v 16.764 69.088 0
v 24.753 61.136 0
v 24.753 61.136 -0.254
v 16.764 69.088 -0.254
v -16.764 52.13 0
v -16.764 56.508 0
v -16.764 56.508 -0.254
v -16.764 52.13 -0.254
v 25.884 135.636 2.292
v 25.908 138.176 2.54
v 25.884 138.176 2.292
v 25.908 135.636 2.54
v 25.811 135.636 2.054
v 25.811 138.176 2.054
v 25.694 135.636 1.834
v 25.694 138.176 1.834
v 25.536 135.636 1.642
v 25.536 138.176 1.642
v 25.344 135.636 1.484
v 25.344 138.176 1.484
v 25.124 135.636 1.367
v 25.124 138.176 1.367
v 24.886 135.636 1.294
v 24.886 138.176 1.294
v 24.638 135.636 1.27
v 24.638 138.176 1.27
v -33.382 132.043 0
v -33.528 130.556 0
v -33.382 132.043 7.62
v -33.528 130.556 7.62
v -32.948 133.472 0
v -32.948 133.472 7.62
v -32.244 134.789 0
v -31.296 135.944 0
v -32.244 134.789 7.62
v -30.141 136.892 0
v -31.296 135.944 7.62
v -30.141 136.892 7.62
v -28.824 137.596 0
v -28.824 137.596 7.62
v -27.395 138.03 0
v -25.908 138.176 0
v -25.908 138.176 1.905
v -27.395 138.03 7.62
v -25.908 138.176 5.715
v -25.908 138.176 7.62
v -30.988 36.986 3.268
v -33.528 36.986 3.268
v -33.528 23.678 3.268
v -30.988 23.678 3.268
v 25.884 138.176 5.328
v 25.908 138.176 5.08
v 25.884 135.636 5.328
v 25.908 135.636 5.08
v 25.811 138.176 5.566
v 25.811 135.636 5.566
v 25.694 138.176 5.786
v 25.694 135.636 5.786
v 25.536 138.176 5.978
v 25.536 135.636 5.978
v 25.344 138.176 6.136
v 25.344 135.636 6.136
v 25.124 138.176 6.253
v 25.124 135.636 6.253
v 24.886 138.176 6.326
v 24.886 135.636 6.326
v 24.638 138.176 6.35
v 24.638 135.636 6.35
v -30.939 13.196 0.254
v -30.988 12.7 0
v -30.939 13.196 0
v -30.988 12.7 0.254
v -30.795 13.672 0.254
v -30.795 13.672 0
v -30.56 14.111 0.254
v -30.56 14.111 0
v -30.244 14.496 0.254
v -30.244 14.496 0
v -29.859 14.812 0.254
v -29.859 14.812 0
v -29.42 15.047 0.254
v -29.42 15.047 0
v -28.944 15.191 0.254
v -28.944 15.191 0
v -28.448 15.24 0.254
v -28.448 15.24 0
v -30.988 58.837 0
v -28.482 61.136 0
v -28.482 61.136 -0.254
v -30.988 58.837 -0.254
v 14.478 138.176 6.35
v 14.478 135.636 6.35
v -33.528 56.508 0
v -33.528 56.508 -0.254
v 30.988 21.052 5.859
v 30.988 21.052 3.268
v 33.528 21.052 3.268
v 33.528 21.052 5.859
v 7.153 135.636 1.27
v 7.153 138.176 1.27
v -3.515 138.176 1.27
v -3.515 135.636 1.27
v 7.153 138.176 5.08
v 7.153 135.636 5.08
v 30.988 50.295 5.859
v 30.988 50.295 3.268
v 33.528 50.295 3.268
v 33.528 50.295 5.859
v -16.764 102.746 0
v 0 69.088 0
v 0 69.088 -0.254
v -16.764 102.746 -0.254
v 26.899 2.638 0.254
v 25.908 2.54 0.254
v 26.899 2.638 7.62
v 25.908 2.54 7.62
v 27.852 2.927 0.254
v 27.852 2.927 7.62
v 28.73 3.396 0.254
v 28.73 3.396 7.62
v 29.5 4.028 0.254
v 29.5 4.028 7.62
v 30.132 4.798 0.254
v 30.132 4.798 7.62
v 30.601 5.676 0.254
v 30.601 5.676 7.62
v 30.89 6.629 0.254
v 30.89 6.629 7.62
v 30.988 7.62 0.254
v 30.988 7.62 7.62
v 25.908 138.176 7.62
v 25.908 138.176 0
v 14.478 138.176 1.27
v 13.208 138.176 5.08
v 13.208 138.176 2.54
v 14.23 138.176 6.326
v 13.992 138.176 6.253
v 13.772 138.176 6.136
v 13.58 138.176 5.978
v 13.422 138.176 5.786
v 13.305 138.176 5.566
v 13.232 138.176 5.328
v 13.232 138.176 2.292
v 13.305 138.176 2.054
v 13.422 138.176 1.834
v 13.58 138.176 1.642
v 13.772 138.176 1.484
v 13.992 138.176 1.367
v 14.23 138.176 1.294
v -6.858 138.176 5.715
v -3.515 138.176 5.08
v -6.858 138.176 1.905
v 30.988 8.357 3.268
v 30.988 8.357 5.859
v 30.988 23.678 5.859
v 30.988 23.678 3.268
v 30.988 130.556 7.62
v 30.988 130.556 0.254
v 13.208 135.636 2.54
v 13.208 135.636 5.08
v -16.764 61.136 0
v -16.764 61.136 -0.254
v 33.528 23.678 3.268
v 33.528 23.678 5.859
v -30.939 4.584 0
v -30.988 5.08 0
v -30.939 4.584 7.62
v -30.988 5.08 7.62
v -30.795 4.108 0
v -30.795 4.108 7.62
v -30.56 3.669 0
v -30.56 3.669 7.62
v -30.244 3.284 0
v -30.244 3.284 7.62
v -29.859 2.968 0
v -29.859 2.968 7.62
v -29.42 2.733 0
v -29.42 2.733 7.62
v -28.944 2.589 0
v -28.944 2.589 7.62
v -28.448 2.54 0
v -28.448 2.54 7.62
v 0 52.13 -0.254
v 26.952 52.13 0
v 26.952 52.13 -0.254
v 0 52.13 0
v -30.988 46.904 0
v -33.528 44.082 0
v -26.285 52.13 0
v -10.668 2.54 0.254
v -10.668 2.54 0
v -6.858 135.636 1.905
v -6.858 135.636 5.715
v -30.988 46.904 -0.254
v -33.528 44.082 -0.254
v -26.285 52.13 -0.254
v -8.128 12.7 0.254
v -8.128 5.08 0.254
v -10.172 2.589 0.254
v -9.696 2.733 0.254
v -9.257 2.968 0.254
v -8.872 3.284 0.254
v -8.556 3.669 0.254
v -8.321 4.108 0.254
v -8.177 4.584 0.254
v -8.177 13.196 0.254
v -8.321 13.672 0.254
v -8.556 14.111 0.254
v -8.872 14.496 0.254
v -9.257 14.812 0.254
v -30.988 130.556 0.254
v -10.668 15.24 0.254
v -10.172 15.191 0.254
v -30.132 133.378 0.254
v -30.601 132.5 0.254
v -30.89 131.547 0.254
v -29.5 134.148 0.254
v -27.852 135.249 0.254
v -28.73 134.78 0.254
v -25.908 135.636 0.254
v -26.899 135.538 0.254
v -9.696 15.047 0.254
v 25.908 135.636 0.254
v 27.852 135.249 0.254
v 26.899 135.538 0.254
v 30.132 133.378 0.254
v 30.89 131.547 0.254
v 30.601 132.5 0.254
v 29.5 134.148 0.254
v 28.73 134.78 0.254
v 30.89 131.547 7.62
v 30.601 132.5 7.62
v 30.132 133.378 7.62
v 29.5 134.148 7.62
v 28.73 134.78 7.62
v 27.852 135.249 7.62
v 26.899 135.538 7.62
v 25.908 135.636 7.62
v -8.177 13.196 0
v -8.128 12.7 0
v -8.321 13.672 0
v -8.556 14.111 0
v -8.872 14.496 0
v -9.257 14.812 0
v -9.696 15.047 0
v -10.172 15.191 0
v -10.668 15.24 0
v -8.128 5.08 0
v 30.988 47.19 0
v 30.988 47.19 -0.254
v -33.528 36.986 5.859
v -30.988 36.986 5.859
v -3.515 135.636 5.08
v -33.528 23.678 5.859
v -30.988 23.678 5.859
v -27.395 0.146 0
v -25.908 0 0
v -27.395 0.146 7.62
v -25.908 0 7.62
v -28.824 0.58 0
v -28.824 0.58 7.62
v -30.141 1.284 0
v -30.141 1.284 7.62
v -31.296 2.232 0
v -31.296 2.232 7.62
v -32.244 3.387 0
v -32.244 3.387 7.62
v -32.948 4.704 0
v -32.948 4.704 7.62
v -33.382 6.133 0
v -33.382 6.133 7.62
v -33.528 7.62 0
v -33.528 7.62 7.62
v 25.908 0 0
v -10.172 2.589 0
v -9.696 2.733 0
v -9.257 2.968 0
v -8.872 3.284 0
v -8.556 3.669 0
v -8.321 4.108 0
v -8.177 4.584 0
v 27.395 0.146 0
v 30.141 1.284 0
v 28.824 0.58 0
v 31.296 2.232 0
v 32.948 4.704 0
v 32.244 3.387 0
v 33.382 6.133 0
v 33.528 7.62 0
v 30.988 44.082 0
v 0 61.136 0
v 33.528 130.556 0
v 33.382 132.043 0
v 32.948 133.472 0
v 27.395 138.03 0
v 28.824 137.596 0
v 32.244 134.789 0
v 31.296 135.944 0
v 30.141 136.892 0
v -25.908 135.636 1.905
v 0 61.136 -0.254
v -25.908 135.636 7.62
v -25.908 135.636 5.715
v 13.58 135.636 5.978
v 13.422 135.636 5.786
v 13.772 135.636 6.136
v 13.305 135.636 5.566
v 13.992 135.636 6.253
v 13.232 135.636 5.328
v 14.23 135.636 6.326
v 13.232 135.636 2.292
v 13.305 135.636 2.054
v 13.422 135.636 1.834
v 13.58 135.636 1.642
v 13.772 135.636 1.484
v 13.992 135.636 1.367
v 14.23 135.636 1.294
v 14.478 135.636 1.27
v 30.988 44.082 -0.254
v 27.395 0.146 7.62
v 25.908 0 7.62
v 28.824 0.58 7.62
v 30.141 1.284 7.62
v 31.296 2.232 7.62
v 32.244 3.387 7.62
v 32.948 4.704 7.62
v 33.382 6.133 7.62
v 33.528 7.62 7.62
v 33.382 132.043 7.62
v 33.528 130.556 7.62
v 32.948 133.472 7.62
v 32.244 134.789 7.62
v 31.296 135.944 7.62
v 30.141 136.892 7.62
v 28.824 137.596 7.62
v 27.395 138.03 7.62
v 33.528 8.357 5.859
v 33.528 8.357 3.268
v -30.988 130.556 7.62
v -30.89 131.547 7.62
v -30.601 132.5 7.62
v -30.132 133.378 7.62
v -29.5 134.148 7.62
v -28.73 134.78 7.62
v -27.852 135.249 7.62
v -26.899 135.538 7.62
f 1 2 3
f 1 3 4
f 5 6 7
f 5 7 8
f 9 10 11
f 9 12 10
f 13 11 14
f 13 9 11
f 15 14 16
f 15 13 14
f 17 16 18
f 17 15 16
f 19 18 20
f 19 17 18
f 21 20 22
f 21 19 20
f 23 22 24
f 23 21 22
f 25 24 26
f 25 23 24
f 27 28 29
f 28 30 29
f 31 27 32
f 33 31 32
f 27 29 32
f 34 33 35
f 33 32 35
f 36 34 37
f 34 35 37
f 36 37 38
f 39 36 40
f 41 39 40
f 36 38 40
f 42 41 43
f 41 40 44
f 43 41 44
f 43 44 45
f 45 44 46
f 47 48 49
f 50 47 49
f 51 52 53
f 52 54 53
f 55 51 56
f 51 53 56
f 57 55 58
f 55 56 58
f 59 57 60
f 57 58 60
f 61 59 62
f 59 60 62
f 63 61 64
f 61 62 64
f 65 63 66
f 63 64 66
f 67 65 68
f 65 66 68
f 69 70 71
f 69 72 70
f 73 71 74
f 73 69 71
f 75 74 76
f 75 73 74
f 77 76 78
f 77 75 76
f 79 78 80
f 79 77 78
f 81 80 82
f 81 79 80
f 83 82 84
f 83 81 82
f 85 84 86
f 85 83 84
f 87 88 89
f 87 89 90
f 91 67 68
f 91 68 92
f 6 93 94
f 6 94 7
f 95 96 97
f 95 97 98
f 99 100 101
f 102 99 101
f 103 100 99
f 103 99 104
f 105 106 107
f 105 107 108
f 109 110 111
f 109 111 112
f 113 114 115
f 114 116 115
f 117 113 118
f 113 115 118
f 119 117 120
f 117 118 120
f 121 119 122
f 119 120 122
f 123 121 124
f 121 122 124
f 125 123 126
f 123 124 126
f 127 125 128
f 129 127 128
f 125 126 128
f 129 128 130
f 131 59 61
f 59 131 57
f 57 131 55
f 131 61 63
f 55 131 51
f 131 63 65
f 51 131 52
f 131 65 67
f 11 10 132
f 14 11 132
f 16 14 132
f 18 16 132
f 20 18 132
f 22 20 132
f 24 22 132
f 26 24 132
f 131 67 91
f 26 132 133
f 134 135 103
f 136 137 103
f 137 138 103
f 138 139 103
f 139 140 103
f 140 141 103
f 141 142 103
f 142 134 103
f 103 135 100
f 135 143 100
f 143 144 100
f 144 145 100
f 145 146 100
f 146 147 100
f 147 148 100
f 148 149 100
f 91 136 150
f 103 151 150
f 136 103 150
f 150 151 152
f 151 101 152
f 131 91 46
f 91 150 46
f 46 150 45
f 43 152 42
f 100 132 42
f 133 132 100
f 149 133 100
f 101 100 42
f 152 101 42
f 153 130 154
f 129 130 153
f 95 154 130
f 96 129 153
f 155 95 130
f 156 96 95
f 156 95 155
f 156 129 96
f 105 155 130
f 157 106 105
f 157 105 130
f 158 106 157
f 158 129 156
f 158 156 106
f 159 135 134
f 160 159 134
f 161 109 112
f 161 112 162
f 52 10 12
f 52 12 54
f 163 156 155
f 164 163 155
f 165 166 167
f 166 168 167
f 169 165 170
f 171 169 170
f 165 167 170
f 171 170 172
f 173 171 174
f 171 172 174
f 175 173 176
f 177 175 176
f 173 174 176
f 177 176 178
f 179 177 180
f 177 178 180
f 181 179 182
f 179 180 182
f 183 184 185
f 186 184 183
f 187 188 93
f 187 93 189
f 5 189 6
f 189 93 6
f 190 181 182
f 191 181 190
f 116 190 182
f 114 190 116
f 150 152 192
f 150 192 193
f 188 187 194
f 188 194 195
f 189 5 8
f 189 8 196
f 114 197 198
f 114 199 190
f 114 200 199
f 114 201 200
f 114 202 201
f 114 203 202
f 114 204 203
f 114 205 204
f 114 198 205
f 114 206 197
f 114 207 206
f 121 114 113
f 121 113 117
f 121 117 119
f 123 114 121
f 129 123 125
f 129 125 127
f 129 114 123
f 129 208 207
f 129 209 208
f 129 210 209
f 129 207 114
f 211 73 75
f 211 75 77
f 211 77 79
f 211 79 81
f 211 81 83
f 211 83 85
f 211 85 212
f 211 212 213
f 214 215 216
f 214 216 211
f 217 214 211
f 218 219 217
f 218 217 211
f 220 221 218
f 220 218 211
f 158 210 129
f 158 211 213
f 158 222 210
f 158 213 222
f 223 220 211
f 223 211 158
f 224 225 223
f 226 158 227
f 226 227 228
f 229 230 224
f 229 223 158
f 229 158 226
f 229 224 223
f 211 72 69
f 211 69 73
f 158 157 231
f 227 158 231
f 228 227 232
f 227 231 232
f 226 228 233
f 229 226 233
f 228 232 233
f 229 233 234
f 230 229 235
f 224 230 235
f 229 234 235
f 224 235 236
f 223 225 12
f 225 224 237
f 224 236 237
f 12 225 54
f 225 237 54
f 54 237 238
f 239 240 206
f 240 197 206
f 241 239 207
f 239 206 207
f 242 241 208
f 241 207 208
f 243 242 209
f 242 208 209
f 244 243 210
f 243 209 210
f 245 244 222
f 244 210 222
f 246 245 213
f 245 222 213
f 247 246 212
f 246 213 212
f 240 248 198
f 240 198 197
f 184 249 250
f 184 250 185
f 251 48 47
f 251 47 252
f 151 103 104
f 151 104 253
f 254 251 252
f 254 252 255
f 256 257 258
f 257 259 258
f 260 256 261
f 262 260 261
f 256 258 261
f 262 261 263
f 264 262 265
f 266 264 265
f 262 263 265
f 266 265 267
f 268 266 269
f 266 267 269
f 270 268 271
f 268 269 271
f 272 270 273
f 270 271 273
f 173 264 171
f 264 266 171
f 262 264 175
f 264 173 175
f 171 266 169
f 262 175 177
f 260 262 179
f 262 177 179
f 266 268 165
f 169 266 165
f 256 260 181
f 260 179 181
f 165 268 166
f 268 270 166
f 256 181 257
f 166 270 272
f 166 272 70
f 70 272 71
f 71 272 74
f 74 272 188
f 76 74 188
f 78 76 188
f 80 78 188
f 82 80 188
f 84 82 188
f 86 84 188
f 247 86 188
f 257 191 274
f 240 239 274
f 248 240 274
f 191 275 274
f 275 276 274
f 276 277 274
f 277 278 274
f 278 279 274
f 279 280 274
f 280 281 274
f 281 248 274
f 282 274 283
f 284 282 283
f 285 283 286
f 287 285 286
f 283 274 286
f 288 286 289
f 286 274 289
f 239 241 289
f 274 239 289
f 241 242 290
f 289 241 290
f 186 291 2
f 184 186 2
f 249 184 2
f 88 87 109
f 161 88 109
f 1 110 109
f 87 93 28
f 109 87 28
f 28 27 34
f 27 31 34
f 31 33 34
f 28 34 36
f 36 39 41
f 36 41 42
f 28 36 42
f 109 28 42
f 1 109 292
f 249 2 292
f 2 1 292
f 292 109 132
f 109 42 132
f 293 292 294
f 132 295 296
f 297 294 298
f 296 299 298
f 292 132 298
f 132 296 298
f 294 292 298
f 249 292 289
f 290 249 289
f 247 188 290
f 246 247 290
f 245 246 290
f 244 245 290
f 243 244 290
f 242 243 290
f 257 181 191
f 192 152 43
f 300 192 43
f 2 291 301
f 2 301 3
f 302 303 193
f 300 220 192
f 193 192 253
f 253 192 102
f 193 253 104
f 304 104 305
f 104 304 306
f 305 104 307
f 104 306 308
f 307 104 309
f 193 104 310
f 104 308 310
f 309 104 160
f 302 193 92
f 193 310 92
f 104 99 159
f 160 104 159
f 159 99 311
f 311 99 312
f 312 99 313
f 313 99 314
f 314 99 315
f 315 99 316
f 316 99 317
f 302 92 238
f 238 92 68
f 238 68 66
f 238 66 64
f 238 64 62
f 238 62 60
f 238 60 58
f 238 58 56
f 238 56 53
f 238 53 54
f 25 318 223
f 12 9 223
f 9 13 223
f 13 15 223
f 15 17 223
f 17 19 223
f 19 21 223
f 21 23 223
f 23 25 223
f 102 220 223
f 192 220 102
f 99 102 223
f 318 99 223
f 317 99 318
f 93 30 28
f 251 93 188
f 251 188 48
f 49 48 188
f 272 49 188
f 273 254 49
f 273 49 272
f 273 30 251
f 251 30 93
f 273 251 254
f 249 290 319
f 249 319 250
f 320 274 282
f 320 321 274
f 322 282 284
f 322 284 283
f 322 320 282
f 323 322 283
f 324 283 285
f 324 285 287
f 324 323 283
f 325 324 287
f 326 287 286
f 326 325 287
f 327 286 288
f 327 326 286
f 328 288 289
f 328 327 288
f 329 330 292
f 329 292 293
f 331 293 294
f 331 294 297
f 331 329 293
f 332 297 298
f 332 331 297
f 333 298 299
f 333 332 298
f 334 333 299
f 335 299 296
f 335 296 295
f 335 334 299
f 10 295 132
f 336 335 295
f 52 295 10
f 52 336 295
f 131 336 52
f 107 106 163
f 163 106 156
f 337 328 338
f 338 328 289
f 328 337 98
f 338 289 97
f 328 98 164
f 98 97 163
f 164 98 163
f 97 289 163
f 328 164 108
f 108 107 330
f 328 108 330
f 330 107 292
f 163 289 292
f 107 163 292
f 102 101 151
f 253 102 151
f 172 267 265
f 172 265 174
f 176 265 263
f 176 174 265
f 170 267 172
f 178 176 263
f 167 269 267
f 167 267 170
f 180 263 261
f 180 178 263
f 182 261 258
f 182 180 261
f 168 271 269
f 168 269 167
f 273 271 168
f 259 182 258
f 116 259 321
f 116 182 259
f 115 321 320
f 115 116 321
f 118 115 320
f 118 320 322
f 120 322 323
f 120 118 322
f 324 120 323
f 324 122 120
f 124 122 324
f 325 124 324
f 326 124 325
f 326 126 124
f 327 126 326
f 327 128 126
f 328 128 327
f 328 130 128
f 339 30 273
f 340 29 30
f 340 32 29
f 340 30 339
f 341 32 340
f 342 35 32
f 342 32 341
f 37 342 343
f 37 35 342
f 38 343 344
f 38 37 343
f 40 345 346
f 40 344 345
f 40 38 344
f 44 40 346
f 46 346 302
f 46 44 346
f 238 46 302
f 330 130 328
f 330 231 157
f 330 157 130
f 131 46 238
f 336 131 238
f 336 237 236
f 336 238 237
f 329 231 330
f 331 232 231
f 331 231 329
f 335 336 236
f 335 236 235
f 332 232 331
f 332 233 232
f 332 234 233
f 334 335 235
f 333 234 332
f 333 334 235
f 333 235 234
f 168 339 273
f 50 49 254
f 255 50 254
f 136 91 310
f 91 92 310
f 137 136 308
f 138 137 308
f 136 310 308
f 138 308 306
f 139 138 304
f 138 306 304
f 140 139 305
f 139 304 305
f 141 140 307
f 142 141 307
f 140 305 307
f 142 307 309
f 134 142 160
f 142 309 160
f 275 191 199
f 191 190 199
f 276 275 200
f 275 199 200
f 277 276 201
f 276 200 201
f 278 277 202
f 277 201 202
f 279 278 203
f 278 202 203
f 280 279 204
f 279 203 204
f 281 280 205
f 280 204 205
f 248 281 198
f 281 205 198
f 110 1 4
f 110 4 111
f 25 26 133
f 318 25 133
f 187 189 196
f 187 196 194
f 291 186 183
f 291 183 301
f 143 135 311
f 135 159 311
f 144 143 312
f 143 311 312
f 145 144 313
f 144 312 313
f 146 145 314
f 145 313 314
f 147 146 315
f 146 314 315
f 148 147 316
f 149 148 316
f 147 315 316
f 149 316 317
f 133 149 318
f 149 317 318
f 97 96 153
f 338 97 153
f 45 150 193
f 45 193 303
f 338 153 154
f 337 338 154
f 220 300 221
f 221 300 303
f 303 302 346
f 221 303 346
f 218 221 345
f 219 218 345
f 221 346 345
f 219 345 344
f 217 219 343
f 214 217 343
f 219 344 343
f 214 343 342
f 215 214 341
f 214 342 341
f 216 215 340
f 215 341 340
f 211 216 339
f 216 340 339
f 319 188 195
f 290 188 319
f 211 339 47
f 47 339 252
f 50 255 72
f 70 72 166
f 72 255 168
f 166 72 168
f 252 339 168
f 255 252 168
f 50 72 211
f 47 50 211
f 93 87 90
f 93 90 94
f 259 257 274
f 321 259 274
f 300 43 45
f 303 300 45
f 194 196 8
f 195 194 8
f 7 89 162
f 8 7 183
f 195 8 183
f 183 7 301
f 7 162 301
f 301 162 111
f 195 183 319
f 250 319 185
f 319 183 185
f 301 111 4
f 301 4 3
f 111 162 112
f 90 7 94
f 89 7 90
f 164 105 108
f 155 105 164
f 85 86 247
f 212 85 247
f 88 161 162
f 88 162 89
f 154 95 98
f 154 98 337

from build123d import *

# Parameters (mm, degrees)
F0_W      = 61.976
F0_H      = 133.096
F1_DEPTH  = 7.62
F2_DEPTH  = 0.254
F3_R      = 7.62
F4_R      = 5.08
F6_DEPTH  = 0.254
F7_W      = 26.6171786934
F7_H      = 2.5910458062
F7_W_2    = 12.6955425367
F8_DEPTH  = 381
F9_W      = 12.6955425367
F9_H      = 2.5910458062
F10_DEPTH = 2.54
F11_W     = 13.3085893467
F11_H     = 2.5910458062
F12_DEPTH = 2.54
F13_W     = 22.86
F13_H     = 12.7
F14_DEPTH = 25.4
F15_R     = 2.54
F16_W     = 12.7
F16_H     = 5.08
F17_DEPTH = 25.4
F18_R     = 1.27
F19_W     = 19.05
F19_H     = 3.81
F20_DEPTH = 25.4
F21_W     = 10.6675168499
F21_H     = 3.81
F22_DEPTH = 25.4


with BuildPart() as f1:
    # F0 (on Top) → F1 (new body)
    with BuildSketch(Plane.XY):
        Polygon((-33.528, 0), (0, 0), (33.528, 0), (33.528, 138.176), (0, 138.176), (-33.528, 138.176), align=None)
        with Locations((0, 69.088)):
            Rectangle(F0_W, F0_H, mode=Mode.SUBTRACT)
    extrude(amount=F1_DEPTH)

    # F0 (on Top) → F2 (join)
    with BuildSketch(Plane.XY):
        with Locations((0, 69.088)):
            Rectangle(F0_W, F0_H)
    extrude(amount=F2_DEPTH)

    # F3
    f3_edges = [f1.edges().sort_by_distance(p)[0] for p in [
        (-33.528, 0, 3.81),
        (33.528, 0, 3.81),
        (33.528, 138.176, 3.81),
        (-33.528, 138.176, 3.81),
    ]]
    fillet(f3_edges, radius=F3_R)

    # F4
    f4_edges = [f1.edges().sort_by_distance(p)[0] for p in [
        (-30.988, 135.636, 3.937),
        (30.988, 135.636, 3.937),
        (-30.988, 2.54, 3.937),
        (30.988, 2.54, 3.937),
    ]]
    fillet(f4_edges, radius=F4_R)

    # F5 (on face) → F6 (join)
    with BuildSketch(Plane.XY):
        Polygon((-30.988, 58.8372340277), (-33.528, 56.507691741), (-30.988, 56.507691741), align=None)
        Polygon((16.764, 69.088), (0, 69.088), (-16.764, 69.088), (-16.764, 61.135802418), (-28.4817721695, 61.135802418), (-30.988, 58.8372340277), (-30.988, 56.507691741), (-16.764, 56.507691741), (-16.764, 52.1295331419), (-26.285154745, 52.1295331419), (-30.988, 46.9043472506), (-30.988, 44.0822318196), (0, 44.0822318196), (30.988, 44.0822318196), (30.988, 47.1902959351), (26.9515123218, 52.1295331419), (0, 52.1295331419), (0, 61.135802418), (24.7533507645, 61.135802418), align=None)
        Polygon((-16.764, 69.088), (0, 69.088), (-16.764, 102.7458906174), align=None)
        Polygon((-30.988, 46.9043472506), (-33.528, 44.0822318196), (-30.988, 44.0822318196), align=None)
    extrude(amount=-F6_DEPTH)

    # F7 (on face) → F8 (cut)
    with BuildSketch(Plane(origin=(-33.528, 0, 0), x_dir=(0, -1, 0), z_dir=(-1, 0, 0))):
        with Locations((-36.9863724336, 4.5639382442)):
            Rectangle(F7_W, F7_H)
        with Locations((-14.7045073099, 4.5639382442)):
            Rectangle(F7_W_2, F7_H)
    extrude(amount=-F8_DEPTH, mode=Mode.SUBTRACT)

    # F9 (on face) → F10 (join)
    with BuildSketch(Plane(origin=(-33.528, 0, 0), x_dir=(0, -1, 0), z_dir=(-1, 0, 0))):
        with Locations((-14.7045073099, 4.5639382442)):
            Rectangle(F9_W, F9_H)
    extrude(amount=-F10_DEPTH)

    # F11 (on face) → F12 (join)
    with BuildSketch(Plane(origin=(-33.528, 0, 0), x_dir=(0, -1, 0), z_dir=(-1, 0, 0))):
        with Locations((-43.640667107, 4.5639382442)):
            Rectangle(F11_W, F11_H)
    extrude(amount=-F12_DEPTH)

    # F13 (on face) → F14 (cut)
    with BuildSketch(Plane.XY):
        with Locations((-19.558, 8.89)):
            Rectangle(F13_W, F13_H)
    extrude(amount=F14_DEPTH, mode=Mode.SUBTRACT)

    # F15
    f15_edges = [f1.edges().sort_by_distance(p)[0] for p in [
        (-8.128, 15.24, 0.127),
        (-8.128, 2.54, 0.127),
        (-30.988, 2.54, 3.81),
        (-30.988, 15.24, 0.127),
    ]]
    fillet(f15_edges, radius=F15_R)

    # F16 (on face) → F17 (cut)
    with BuildSketch(Plane(origin=(0, 138.176, 0), x_dir=(-1, 0, 0), z_dir=(0, 1, 0))):
        with Locations((-19.558, 3.81)):
            Rectangle(F16_W, F16_H)
    extrude(amount=-F17_DEPTH, mode=Mode.SUBTRACT)

    # F18
    f18_edges = [f1.edges().sort_by_distance(p)[0] for p in [
        (13.208, 136.906, 1.27),
        (25.908, 136.906, 1.27),
        (25.908, 136.906, 6.35),
        (13.208, 136.906, 6.35),
    ]]
    fillet(f18_edges, radius=F18_R)

    # F19 (on face) → F20 (cut)
    with BuildSketch(Plane(origin=(0, 138.176, 0), x_dir=(-1, 0, 0), z_dir=(0, 1, 0))):
        with Locations((16.383, 3.81)):
            Rectangle(F19_W, F19_H)
    extrude(amount=-F20_DEPTH, mode=Mode.SUBTRACT)

    # F21 (on face) → F22 (cut)
    with BuildSketch(Plane(origin=(0, 138.176, 0), x_dir=(-1, 0, 0), z_dir=(0, 1, 0))):
        with Locations((-1.8188538961, 3.175)):
            Rectangle(F21_W, F21_H)
    extrude(amount=-F22_DEPTH, mode=Mode.SUBTRACT)


solid = f1.part
